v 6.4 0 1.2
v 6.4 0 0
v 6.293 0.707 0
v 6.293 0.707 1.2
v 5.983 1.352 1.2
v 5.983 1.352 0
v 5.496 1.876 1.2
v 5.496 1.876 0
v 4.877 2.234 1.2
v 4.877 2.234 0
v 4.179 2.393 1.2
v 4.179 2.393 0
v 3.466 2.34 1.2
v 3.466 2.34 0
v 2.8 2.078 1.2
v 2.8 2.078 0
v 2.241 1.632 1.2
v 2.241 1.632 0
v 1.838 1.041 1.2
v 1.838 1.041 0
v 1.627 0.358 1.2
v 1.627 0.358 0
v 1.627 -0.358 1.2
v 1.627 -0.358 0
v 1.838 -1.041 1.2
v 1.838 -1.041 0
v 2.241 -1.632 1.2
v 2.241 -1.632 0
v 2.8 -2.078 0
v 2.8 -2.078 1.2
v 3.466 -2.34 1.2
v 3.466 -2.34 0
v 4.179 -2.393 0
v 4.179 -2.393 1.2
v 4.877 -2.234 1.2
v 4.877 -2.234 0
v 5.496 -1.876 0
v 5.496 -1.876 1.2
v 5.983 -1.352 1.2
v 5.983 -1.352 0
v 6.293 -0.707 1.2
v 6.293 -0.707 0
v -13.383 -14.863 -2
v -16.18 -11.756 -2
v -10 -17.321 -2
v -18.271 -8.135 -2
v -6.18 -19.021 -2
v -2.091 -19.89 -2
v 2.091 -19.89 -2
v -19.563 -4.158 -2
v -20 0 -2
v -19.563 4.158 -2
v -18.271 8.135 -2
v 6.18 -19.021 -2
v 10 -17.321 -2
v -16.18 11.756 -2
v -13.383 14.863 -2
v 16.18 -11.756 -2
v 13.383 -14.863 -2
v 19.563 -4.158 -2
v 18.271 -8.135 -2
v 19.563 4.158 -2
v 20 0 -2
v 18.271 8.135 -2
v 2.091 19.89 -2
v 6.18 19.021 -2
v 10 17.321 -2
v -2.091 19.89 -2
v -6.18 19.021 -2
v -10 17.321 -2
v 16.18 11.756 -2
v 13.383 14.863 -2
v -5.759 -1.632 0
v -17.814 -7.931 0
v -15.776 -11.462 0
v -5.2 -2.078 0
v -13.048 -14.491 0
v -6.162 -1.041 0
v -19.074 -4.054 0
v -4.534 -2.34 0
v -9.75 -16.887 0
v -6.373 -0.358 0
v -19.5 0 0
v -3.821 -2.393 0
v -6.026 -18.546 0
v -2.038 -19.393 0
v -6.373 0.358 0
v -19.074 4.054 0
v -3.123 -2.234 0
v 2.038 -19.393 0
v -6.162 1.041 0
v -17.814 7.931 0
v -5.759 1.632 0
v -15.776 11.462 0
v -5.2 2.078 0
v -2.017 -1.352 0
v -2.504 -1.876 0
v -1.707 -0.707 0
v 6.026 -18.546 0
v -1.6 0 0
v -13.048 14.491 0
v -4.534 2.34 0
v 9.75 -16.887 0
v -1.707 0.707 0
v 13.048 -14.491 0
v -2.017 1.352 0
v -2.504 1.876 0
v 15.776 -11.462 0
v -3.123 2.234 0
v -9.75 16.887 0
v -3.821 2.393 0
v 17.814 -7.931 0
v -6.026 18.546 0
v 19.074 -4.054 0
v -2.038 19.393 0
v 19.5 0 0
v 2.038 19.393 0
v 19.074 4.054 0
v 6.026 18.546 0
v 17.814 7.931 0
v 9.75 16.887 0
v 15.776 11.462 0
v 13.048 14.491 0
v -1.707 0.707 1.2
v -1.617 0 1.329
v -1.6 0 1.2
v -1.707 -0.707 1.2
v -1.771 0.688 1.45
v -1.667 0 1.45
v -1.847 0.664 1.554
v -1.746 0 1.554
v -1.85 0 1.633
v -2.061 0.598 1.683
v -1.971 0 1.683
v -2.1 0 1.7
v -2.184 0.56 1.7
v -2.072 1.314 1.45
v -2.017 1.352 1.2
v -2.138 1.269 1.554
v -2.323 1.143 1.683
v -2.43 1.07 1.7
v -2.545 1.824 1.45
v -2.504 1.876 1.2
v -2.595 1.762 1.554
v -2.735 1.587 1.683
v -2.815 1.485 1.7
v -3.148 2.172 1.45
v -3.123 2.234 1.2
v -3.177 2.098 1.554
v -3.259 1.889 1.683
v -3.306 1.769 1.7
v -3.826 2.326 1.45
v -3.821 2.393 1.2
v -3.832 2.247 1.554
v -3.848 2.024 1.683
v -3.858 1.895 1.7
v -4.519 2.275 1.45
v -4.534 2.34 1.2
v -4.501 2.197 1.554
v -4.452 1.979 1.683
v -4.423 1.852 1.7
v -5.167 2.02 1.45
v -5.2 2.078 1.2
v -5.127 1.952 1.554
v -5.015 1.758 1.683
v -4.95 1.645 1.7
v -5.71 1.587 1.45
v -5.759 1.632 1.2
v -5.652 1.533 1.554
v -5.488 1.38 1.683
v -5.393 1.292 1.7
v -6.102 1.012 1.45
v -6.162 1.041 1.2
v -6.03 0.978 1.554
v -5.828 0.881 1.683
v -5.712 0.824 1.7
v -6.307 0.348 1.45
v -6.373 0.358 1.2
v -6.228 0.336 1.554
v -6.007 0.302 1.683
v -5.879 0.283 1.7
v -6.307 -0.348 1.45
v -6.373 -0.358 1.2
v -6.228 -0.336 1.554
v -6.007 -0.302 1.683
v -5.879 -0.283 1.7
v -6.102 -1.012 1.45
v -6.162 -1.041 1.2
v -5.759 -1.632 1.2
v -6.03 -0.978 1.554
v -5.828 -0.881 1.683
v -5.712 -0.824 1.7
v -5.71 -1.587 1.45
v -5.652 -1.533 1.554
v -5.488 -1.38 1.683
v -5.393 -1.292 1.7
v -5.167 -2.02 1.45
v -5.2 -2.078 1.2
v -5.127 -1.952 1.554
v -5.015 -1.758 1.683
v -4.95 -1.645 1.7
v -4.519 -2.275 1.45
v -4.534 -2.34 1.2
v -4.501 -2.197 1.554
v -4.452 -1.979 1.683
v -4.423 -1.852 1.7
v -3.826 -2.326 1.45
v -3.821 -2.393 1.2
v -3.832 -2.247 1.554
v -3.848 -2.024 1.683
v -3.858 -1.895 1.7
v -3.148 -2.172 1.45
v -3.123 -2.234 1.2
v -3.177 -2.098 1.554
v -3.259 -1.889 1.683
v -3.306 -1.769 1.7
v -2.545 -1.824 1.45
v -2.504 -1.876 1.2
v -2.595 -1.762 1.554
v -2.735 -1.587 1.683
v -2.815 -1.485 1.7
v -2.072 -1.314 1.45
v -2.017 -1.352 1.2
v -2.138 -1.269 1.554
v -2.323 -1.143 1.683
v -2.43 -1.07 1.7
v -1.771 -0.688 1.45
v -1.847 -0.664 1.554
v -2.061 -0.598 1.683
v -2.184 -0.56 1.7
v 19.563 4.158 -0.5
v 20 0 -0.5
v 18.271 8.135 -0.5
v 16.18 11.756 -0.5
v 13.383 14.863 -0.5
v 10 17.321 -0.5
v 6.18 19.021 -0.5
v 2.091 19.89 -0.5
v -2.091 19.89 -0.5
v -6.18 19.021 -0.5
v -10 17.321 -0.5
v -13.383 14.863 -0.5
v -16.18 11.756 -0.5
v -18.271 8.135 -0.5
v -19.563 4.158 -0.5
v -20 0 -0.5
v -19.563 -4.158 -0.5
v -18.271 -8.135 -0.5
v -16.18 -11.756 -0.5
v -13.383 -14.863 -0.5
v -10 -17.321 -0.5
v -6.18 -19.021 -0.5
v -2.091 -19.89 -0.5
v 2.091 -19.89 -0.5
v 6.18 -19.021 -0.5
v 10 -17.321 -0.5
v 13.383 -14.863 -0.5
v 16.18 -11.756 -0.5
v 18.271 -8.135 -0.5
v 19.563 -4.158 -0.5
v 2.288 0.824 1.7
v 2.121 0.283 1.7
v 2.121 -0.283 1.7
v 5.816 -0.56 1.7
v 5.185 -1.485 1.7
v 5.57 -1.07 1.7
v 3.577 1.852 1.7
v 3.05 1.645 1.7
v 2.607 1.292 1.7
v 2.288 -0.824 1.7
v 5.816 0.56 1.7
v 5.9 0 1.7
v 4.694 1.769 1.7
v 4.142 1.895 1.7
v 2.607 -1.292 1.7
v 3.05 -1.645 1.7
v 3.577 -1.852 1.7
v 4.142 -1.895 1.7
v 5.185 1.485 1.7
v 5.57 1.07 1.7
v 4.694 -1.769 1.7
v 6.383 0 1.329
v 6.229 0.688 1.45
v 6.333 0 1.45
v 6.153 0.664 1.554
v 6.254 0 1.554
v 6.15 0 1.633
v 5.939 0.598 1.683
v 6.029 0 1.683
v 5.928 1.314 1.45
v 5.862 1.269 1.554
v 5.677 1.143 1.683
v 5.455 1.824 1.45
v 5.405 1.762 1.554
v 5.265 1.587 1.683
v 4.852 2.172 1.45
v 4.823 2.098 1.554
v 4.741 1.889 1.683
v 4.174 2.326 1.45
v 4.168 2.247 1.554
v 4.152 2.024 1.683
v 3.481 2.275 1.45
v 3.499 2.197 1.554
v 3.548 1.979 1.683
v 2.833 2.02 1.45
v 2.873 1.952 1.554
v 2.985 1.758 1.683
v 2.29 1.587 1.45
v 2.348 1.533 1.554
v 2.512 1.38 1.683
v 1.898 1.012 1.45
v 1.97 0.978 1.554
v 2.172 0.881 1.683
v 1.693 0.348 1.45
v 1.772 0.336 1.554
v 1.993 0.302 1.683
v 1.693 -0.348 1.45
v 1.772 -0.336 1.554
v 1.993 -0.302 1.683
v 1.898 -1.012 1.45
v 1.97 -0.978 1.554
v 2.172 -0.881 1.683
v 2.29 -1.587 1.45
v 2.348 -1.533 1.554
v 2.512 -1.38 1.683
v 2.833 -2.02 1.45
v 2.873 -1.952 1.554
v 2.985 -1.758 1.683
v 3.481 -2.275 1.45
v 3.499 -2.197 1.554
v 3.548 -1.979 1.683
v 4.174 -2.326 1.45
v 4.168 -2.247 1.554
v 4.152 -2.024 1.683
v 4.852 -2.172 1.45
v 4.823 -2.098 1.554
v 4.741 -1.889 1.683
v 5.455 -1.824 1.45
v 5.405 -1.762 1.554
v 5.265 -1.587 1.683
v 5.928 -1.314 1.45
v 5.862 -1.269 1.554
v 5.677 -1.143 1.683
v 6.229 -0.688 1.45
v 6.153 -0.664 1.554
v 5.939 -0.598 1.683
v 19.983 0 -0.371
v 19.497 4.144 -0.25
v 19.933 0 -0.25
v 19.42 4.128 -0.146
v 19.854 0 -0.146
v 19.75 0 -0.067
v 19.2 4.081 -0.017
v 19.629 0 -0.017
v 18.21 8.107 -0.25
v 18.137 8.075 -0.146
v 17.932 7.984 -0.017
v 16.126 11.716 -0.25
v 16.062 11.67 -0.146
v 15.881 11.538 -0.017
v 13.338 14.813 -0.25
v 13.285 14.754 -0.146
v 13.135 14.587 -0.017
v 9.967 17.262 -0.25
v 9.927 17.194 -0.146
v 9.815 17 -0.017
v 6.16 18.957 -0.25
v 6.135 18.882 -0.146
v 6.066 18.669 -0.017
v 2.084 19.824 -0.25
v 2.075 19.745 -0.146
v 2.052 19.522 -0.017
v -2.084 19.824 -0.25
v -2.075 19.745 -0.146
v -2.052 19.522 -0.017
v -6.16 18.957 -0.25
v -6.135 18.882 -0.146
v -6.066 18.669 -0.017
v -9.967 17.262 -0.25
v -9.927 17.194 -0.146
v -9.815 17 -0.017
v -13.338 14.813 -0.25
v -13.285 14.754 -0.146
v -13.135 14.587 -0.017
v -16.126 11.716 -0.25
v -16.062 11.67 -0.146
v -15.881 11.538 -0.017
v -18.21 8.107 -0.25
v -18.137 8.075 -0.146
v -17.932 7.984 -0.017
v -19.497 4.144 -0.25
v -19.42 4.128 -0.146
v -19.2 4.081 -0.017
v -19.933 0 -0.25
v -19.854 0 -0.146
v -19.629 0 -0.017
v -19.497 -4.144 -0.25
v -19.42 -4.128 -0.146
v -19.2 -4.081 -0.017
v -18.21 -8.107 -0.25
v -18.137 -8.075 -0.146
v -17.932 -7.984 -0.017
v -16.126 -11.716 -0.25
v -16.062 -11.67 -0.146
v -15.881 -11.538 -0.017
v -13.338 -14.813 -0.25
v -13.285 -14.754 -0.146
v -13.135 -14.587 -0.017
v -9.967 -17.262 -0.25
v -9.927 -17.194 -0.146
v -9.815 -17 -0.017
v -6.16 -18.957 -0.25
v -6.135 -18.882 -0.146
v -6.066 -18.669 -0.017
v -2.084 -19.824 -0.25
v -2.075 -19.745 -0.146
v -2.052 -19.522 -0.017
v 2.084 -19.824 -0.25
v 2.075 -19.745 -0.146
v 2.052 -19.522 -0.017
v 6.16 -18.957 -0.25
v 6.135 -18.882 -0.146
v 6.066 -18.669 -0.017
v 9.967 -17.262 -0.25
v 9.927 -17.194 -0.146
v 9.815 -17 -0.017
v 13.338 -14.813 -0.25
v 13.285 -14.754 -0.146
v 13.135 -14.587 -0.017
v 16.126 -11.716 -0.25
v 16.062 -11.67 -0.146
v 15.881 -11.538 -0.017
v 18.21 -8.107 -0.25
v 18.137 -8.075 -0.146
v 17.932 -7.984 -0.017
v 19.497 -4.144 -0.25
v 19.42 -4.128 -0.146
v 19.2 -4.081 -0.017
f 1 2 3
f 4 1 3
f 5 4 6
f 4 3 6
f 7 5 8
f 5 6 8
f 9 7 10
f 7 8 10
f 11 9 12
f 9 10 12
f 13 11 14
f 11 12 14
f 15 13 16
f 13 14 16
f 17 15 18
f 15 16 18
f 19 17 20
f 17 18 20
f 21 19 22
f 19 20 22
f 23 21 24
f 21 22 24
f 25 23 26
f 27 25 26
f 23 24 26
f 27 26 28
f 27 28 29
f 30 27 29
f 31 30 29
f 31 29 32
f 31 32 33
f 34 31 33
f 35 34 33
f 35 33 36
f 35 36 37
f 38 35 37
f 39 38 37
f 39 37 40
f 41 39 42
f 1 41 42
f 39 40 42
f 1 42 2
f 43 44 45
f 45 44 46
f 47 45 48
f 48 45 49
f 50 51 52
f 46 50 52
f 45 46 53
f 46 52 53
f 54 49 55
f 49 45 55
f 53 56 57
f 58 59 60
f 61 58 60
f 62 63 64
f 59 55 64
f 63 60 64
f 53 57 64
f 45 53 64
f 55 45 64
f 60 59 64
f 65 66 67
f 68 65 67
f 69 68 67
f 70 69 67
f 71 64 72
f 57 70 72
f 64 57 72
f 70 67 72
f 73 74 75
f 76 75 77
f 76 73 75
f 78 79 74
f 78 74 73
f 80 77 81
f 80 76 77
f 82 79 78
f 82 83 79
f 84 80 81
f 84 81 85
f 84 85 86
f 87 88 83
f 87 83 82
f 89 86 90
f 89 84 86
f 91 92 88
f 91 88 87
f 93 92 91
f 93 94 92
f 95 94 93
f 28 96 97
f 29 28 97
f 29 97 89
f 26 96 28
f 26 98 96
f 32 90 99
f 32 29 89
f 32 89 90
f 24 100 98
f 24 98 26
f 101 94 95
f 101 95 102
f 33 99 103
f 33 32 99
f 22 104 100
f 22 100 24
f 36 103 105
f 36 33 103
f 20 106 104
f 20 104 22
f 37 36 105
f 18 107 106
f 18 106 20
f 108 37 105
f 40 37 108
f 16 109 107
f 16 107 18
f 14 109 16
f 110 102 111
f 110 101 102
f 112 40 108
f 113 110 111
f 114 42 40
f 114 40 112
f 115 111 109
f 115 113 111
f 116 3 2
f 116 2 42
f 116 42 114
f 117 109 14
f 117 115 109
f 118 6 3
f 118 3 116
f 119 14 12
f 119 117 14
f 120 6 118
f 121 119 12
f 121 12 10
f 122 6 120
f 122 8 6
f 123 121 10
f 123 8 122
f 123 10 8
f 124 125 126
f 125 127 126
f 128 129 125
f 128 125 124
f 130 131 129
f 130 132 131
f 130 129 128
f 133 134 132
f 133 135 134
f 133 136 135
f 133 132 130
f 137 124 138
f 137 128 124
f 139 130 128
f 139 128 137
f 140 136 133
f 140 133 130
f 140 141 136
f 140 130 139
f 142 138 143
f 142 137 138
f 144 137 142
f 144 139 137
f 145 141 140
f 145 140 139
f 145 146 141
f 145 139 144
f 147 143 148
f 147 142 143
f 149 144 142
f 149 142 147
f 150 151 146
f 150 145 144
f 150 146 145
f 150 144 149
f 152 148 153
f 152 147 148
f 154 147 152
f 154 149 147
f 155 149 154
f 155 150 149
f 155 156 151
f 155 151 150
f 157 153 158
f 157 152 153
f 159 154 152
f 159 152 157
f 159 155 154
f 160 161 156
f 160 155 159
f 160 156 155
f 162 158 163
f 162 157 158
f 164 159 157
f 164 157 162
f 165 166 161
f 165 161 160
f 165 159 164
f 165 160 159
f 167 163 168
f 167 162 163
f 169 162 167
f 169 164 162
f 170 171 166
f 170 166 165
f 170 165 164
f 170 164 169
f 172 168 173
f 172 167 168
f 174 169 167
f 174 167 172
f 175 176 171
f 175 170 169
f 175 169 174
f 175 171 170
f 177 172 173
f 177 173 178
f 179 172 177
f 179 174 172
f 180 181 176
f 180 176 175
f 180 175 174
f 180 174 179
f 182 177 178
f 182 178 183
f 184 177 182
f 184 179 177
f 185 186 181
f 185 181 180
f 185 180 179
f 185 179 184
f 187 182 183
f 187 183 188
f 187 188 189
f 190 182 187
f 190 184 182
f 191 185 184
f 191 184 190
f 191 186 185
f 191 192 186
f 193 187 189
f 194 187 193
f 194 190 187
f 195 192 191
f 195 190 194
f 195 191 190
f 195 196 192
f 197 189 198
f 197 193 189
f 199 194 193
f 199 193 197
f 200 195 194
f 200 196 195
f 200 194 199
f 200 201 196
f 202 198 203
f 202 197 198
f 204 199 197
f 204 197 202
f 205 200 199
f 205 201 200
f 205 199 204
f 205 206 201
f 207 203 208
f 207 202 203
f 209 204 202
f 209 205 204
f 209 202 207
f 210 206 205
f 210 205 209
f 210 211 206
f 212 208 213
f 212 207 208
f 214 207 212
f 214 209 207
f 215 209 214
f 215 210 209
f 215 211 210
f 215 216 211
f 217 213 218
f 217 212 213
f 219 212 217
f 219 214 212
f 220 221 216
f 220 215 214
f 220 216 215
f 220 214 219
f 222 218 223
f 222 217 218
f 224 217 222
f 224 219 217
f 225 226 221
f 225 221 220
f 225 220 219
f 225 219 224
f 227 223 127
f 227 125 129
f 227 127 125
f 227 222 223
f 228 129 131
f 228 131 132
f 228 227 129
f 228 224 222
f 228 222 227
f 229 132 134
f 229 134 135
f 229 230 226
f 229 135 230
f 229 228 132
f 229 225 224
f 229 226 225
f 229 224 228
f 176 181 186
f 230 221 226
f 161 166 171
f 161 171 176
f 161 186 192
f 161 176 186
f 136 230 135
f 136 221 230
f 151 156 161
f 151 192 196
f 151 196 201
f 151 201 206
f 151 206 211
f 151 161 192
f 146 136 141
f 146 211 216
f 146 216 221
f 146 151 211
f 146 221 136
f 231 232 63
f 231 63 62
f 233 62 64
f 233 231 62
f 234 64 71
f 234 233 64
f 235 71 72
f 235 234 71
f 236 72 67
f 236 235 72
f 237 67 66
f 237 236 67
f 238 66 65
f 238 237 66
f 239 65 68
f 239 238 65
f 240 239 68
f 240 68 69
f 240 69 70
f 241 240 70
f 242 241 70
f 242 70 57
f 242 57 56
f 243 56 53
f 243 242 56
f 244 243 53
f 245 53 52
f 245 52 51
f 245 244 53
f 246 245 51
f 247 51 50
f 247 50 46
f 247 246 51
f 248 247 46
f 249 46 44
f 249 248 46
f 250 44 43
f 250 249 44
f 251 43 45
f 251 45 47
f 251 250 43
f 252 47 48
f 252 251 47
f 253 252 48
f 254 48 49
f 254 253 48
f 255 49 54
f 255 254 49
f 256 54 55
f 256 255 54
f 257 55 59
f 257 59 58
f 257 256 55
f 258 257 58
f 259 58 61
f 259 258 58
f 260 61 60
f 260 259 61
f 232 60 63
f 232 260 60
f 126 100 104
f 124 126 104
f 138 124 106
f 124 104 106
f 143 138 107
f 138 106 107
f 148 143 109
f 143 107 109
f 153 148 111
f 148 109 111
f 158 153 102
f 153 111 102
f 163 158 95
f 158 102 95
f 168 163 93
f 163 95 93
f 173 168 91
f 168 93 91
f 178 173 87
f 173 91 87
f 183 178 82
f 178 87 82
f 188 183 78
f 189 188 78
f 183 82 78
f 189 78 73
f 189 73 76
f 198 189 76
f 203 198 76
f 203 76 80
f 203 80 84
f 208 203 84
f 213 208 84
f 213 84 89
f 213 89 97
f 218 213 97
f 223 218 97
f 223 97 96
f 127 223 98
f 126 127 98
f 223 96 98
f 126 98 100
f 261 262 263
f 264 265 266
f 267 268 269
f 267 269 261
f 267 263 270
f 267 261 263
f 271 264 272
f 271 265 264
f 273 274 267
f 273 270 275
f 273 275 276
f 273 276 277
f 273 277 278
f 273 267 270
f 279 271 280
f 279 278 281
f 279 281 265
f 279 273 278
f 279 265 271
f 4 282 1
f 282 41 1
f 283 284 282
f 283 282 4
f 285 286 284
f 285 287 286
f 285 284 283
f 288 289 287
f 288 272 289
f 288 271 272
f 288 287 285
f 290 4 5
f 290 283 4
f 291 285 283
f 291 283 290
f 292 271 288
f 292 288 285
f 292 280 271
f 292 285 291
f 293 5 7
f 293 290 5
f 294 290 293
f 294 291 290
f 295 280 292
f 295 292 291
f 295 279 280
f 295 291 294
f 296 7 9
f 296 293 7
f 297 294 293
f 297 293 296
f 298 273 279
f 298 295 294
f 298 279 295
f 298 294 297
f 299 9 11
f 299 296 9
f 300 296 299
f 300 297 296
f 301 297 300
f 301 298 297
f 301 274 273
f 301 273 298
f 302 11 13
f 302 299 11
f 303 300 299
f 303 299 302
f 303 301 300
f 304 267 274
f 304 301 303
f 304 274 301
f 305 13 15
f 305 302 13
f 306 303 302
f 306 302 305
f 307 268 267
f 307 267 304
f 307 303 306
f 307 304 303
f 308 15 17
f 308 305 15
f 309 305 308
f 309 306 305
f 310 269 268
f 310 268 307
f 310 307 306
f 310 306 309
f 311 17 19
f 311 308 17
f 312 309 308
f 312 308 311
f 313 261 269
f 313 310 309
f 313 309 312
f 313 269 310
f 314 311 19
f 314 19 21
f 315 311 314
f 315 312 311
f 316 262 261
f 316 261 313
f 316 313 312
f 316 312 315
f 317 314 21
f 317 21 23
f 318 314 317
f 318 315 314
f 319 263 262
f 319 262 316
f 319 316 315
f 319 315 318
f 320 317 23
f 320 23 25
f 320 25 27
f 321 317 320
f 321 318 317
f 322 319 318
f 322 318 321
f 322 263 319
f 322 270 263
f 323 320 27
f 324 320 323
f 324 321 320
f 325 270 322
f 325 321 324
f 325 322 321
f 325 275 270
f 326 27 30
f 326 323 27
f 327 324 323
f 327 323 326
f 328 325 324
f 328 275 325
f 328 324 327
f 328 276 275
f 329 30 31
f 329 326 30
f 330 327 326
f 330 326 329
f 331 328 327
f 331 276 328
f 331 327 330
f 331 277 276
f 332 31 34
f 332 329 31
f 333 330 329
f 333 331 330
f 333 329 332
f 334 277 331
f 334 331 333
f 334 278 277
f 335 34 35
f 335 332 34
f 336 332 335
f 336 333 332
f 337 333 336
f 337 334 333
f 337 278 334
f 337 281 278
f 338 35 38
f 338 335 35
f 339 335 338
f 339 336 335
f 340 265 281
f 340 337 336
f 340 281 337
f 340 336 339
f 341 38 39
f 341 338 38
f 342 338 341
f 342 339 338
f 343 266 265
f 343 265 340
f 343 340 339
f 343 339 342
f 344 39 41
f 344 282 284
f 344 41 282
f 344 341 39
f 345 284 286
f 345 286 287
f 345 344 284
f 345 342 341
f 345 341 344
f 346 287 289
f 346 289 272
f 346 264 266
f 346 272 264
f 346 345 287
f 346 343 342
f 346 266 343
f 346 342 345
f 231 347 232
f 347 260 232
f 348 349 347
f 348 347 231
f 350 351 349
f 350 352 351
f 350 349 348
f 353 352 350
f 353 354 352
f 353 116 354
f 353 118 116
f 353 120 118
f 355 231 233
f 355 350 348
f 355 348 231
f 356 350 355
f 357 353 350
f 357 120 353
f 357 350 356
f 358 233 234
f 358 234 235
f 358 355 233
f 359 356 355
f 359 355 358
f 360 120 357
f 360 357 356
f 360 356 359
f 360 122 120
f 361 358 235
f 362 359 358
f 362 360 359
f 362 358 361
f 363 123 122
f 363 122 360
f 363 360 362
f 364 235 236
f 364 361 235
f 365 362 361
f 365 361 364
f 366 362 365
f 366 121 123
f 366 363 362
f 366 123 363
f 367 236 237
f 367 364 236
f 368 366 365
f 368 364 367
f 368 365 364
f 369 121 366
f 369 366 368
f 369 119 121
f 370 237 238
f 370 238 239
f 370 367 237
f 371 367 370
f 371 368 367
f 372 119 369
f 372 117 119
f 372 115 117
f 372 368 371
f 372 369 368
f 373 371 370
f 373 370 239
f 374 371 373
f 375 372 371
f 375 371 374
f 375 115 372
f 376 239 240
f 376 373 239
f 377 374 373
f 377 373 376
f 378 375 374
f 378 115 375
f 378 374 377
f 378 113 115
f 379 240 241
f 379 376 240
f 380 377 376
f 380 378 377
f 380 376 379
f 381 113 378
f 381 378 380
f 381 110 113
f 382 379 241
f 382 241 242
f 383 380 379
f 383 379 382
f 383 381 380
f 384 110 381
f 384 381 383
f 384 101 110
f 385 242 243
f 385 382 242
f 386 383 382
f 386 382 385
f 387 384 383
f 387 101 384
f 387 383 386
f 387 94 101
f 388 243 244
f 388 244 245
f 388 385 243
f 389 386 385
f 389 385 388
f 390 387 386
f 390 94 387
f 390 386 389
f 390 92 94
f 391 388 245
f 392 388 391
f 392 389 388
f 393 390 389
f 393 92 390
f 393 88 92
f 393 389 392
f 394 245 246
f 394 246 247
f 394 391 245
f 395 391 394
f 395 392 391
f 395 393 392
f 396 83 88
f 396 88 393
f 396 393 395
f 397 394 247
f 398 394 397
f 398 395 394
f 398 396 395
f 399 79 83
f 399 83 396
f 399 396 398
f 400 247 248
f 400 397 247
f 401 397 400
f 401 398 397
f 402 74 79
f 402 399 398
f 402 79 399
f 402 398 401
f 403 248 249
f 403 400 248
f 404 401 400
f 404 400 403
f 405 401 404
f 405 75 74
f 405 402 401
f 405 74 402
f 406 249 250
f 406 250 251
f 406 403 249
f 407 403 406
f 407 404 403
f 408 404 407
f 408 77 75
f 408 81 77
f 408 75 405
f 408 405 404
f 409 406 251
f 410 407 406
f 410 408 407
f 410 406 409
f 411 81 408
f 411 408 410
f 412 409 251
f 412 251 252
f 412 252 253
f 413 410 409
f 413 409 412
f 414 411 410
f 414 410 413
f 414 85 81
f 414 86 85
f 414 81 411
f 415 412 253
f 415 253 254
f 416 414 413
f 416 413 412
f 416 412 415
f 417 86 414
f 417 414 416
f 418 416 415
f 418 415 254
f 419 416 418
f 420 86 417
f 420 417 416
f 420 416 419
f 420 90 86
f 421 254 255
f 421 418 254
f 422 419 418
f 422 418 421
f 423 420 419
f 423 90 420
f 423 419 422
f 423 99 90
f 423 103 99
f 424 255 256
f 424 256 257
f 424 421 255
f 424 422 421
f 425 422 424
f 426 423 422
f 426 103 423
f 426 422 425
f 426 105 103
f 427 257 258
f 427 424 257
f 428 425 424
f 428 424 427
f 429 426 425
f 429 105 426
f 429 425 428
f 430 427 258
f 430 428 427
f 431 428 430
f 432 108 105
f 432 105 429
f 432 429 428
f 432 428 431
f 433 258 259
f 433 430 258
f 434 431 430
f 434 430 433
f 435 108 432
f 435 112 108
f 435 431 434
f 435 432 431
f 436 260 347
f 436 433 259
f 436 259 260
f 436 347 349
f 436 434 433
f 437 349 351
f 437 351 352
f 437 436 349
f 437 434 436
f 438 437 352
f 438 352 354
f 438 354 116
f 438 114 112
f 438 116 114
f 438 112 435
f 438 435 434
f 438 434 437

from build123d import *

# Parameters (mm, degrees)
F0_R     = 2.4
F1_DEPTH = 1.7
F0_R_2   = 20
F2_DEPTH = 2
F3_R     = 0.5
F4_DEPTH = 2


with BuildPart() as f1:
    # F0 (on Top) → F1 (new body)
    with BuildSketch(Plane.XY):
        with Locations((-4, 0)):
            Circle(F0_R)
    extrude(amount=F1_DEPTH)



with BuildPart() as f1b:
    # F0 (on Top) → F1, piece 2 (new body)
    with BuildSketch(Plane.XY):
        with Locations((4, 0)):
            Circle(F0_R)
    extrude(amount=F1_DEPTH)


with BuildPart() as f1_1:
    add(f1.part)

    add(f1b.part)  # F2 merges F1b
    # F0 (on Top) → F2 (join)
    with BuildSketch(Plane.XY):
        Circle(F0_R_2)
        with Locations((-4, 0)):
            Circle(F0_R, mode=Mode.SUBTRACT)
        with Locations((4, 0)):
            Circle(F0_R, mode=Mode.SUBTRACT)
    extrude(amount=-F2_DEPTH)

    # F3
    f3_edges = [f1_1.edges().sort_by_distance(p)[0] for p in [
        (-6.4, 0, 1.7),
        (1.6, 0, 1.7),
        (-20, 0, 0),
    ]]
    fillet(f3_edges, radius=F3_R)

    # F4 (add): faces of the model
    f4_faces = [f1_1.faces().sort_by_distance(p)[0] for p in [
        (-4, 0, 0),
        (4, 0, 0),
    ]]
    extrude(f4_faces, amount=F4_DEPTH)


solid = f1_1.part
